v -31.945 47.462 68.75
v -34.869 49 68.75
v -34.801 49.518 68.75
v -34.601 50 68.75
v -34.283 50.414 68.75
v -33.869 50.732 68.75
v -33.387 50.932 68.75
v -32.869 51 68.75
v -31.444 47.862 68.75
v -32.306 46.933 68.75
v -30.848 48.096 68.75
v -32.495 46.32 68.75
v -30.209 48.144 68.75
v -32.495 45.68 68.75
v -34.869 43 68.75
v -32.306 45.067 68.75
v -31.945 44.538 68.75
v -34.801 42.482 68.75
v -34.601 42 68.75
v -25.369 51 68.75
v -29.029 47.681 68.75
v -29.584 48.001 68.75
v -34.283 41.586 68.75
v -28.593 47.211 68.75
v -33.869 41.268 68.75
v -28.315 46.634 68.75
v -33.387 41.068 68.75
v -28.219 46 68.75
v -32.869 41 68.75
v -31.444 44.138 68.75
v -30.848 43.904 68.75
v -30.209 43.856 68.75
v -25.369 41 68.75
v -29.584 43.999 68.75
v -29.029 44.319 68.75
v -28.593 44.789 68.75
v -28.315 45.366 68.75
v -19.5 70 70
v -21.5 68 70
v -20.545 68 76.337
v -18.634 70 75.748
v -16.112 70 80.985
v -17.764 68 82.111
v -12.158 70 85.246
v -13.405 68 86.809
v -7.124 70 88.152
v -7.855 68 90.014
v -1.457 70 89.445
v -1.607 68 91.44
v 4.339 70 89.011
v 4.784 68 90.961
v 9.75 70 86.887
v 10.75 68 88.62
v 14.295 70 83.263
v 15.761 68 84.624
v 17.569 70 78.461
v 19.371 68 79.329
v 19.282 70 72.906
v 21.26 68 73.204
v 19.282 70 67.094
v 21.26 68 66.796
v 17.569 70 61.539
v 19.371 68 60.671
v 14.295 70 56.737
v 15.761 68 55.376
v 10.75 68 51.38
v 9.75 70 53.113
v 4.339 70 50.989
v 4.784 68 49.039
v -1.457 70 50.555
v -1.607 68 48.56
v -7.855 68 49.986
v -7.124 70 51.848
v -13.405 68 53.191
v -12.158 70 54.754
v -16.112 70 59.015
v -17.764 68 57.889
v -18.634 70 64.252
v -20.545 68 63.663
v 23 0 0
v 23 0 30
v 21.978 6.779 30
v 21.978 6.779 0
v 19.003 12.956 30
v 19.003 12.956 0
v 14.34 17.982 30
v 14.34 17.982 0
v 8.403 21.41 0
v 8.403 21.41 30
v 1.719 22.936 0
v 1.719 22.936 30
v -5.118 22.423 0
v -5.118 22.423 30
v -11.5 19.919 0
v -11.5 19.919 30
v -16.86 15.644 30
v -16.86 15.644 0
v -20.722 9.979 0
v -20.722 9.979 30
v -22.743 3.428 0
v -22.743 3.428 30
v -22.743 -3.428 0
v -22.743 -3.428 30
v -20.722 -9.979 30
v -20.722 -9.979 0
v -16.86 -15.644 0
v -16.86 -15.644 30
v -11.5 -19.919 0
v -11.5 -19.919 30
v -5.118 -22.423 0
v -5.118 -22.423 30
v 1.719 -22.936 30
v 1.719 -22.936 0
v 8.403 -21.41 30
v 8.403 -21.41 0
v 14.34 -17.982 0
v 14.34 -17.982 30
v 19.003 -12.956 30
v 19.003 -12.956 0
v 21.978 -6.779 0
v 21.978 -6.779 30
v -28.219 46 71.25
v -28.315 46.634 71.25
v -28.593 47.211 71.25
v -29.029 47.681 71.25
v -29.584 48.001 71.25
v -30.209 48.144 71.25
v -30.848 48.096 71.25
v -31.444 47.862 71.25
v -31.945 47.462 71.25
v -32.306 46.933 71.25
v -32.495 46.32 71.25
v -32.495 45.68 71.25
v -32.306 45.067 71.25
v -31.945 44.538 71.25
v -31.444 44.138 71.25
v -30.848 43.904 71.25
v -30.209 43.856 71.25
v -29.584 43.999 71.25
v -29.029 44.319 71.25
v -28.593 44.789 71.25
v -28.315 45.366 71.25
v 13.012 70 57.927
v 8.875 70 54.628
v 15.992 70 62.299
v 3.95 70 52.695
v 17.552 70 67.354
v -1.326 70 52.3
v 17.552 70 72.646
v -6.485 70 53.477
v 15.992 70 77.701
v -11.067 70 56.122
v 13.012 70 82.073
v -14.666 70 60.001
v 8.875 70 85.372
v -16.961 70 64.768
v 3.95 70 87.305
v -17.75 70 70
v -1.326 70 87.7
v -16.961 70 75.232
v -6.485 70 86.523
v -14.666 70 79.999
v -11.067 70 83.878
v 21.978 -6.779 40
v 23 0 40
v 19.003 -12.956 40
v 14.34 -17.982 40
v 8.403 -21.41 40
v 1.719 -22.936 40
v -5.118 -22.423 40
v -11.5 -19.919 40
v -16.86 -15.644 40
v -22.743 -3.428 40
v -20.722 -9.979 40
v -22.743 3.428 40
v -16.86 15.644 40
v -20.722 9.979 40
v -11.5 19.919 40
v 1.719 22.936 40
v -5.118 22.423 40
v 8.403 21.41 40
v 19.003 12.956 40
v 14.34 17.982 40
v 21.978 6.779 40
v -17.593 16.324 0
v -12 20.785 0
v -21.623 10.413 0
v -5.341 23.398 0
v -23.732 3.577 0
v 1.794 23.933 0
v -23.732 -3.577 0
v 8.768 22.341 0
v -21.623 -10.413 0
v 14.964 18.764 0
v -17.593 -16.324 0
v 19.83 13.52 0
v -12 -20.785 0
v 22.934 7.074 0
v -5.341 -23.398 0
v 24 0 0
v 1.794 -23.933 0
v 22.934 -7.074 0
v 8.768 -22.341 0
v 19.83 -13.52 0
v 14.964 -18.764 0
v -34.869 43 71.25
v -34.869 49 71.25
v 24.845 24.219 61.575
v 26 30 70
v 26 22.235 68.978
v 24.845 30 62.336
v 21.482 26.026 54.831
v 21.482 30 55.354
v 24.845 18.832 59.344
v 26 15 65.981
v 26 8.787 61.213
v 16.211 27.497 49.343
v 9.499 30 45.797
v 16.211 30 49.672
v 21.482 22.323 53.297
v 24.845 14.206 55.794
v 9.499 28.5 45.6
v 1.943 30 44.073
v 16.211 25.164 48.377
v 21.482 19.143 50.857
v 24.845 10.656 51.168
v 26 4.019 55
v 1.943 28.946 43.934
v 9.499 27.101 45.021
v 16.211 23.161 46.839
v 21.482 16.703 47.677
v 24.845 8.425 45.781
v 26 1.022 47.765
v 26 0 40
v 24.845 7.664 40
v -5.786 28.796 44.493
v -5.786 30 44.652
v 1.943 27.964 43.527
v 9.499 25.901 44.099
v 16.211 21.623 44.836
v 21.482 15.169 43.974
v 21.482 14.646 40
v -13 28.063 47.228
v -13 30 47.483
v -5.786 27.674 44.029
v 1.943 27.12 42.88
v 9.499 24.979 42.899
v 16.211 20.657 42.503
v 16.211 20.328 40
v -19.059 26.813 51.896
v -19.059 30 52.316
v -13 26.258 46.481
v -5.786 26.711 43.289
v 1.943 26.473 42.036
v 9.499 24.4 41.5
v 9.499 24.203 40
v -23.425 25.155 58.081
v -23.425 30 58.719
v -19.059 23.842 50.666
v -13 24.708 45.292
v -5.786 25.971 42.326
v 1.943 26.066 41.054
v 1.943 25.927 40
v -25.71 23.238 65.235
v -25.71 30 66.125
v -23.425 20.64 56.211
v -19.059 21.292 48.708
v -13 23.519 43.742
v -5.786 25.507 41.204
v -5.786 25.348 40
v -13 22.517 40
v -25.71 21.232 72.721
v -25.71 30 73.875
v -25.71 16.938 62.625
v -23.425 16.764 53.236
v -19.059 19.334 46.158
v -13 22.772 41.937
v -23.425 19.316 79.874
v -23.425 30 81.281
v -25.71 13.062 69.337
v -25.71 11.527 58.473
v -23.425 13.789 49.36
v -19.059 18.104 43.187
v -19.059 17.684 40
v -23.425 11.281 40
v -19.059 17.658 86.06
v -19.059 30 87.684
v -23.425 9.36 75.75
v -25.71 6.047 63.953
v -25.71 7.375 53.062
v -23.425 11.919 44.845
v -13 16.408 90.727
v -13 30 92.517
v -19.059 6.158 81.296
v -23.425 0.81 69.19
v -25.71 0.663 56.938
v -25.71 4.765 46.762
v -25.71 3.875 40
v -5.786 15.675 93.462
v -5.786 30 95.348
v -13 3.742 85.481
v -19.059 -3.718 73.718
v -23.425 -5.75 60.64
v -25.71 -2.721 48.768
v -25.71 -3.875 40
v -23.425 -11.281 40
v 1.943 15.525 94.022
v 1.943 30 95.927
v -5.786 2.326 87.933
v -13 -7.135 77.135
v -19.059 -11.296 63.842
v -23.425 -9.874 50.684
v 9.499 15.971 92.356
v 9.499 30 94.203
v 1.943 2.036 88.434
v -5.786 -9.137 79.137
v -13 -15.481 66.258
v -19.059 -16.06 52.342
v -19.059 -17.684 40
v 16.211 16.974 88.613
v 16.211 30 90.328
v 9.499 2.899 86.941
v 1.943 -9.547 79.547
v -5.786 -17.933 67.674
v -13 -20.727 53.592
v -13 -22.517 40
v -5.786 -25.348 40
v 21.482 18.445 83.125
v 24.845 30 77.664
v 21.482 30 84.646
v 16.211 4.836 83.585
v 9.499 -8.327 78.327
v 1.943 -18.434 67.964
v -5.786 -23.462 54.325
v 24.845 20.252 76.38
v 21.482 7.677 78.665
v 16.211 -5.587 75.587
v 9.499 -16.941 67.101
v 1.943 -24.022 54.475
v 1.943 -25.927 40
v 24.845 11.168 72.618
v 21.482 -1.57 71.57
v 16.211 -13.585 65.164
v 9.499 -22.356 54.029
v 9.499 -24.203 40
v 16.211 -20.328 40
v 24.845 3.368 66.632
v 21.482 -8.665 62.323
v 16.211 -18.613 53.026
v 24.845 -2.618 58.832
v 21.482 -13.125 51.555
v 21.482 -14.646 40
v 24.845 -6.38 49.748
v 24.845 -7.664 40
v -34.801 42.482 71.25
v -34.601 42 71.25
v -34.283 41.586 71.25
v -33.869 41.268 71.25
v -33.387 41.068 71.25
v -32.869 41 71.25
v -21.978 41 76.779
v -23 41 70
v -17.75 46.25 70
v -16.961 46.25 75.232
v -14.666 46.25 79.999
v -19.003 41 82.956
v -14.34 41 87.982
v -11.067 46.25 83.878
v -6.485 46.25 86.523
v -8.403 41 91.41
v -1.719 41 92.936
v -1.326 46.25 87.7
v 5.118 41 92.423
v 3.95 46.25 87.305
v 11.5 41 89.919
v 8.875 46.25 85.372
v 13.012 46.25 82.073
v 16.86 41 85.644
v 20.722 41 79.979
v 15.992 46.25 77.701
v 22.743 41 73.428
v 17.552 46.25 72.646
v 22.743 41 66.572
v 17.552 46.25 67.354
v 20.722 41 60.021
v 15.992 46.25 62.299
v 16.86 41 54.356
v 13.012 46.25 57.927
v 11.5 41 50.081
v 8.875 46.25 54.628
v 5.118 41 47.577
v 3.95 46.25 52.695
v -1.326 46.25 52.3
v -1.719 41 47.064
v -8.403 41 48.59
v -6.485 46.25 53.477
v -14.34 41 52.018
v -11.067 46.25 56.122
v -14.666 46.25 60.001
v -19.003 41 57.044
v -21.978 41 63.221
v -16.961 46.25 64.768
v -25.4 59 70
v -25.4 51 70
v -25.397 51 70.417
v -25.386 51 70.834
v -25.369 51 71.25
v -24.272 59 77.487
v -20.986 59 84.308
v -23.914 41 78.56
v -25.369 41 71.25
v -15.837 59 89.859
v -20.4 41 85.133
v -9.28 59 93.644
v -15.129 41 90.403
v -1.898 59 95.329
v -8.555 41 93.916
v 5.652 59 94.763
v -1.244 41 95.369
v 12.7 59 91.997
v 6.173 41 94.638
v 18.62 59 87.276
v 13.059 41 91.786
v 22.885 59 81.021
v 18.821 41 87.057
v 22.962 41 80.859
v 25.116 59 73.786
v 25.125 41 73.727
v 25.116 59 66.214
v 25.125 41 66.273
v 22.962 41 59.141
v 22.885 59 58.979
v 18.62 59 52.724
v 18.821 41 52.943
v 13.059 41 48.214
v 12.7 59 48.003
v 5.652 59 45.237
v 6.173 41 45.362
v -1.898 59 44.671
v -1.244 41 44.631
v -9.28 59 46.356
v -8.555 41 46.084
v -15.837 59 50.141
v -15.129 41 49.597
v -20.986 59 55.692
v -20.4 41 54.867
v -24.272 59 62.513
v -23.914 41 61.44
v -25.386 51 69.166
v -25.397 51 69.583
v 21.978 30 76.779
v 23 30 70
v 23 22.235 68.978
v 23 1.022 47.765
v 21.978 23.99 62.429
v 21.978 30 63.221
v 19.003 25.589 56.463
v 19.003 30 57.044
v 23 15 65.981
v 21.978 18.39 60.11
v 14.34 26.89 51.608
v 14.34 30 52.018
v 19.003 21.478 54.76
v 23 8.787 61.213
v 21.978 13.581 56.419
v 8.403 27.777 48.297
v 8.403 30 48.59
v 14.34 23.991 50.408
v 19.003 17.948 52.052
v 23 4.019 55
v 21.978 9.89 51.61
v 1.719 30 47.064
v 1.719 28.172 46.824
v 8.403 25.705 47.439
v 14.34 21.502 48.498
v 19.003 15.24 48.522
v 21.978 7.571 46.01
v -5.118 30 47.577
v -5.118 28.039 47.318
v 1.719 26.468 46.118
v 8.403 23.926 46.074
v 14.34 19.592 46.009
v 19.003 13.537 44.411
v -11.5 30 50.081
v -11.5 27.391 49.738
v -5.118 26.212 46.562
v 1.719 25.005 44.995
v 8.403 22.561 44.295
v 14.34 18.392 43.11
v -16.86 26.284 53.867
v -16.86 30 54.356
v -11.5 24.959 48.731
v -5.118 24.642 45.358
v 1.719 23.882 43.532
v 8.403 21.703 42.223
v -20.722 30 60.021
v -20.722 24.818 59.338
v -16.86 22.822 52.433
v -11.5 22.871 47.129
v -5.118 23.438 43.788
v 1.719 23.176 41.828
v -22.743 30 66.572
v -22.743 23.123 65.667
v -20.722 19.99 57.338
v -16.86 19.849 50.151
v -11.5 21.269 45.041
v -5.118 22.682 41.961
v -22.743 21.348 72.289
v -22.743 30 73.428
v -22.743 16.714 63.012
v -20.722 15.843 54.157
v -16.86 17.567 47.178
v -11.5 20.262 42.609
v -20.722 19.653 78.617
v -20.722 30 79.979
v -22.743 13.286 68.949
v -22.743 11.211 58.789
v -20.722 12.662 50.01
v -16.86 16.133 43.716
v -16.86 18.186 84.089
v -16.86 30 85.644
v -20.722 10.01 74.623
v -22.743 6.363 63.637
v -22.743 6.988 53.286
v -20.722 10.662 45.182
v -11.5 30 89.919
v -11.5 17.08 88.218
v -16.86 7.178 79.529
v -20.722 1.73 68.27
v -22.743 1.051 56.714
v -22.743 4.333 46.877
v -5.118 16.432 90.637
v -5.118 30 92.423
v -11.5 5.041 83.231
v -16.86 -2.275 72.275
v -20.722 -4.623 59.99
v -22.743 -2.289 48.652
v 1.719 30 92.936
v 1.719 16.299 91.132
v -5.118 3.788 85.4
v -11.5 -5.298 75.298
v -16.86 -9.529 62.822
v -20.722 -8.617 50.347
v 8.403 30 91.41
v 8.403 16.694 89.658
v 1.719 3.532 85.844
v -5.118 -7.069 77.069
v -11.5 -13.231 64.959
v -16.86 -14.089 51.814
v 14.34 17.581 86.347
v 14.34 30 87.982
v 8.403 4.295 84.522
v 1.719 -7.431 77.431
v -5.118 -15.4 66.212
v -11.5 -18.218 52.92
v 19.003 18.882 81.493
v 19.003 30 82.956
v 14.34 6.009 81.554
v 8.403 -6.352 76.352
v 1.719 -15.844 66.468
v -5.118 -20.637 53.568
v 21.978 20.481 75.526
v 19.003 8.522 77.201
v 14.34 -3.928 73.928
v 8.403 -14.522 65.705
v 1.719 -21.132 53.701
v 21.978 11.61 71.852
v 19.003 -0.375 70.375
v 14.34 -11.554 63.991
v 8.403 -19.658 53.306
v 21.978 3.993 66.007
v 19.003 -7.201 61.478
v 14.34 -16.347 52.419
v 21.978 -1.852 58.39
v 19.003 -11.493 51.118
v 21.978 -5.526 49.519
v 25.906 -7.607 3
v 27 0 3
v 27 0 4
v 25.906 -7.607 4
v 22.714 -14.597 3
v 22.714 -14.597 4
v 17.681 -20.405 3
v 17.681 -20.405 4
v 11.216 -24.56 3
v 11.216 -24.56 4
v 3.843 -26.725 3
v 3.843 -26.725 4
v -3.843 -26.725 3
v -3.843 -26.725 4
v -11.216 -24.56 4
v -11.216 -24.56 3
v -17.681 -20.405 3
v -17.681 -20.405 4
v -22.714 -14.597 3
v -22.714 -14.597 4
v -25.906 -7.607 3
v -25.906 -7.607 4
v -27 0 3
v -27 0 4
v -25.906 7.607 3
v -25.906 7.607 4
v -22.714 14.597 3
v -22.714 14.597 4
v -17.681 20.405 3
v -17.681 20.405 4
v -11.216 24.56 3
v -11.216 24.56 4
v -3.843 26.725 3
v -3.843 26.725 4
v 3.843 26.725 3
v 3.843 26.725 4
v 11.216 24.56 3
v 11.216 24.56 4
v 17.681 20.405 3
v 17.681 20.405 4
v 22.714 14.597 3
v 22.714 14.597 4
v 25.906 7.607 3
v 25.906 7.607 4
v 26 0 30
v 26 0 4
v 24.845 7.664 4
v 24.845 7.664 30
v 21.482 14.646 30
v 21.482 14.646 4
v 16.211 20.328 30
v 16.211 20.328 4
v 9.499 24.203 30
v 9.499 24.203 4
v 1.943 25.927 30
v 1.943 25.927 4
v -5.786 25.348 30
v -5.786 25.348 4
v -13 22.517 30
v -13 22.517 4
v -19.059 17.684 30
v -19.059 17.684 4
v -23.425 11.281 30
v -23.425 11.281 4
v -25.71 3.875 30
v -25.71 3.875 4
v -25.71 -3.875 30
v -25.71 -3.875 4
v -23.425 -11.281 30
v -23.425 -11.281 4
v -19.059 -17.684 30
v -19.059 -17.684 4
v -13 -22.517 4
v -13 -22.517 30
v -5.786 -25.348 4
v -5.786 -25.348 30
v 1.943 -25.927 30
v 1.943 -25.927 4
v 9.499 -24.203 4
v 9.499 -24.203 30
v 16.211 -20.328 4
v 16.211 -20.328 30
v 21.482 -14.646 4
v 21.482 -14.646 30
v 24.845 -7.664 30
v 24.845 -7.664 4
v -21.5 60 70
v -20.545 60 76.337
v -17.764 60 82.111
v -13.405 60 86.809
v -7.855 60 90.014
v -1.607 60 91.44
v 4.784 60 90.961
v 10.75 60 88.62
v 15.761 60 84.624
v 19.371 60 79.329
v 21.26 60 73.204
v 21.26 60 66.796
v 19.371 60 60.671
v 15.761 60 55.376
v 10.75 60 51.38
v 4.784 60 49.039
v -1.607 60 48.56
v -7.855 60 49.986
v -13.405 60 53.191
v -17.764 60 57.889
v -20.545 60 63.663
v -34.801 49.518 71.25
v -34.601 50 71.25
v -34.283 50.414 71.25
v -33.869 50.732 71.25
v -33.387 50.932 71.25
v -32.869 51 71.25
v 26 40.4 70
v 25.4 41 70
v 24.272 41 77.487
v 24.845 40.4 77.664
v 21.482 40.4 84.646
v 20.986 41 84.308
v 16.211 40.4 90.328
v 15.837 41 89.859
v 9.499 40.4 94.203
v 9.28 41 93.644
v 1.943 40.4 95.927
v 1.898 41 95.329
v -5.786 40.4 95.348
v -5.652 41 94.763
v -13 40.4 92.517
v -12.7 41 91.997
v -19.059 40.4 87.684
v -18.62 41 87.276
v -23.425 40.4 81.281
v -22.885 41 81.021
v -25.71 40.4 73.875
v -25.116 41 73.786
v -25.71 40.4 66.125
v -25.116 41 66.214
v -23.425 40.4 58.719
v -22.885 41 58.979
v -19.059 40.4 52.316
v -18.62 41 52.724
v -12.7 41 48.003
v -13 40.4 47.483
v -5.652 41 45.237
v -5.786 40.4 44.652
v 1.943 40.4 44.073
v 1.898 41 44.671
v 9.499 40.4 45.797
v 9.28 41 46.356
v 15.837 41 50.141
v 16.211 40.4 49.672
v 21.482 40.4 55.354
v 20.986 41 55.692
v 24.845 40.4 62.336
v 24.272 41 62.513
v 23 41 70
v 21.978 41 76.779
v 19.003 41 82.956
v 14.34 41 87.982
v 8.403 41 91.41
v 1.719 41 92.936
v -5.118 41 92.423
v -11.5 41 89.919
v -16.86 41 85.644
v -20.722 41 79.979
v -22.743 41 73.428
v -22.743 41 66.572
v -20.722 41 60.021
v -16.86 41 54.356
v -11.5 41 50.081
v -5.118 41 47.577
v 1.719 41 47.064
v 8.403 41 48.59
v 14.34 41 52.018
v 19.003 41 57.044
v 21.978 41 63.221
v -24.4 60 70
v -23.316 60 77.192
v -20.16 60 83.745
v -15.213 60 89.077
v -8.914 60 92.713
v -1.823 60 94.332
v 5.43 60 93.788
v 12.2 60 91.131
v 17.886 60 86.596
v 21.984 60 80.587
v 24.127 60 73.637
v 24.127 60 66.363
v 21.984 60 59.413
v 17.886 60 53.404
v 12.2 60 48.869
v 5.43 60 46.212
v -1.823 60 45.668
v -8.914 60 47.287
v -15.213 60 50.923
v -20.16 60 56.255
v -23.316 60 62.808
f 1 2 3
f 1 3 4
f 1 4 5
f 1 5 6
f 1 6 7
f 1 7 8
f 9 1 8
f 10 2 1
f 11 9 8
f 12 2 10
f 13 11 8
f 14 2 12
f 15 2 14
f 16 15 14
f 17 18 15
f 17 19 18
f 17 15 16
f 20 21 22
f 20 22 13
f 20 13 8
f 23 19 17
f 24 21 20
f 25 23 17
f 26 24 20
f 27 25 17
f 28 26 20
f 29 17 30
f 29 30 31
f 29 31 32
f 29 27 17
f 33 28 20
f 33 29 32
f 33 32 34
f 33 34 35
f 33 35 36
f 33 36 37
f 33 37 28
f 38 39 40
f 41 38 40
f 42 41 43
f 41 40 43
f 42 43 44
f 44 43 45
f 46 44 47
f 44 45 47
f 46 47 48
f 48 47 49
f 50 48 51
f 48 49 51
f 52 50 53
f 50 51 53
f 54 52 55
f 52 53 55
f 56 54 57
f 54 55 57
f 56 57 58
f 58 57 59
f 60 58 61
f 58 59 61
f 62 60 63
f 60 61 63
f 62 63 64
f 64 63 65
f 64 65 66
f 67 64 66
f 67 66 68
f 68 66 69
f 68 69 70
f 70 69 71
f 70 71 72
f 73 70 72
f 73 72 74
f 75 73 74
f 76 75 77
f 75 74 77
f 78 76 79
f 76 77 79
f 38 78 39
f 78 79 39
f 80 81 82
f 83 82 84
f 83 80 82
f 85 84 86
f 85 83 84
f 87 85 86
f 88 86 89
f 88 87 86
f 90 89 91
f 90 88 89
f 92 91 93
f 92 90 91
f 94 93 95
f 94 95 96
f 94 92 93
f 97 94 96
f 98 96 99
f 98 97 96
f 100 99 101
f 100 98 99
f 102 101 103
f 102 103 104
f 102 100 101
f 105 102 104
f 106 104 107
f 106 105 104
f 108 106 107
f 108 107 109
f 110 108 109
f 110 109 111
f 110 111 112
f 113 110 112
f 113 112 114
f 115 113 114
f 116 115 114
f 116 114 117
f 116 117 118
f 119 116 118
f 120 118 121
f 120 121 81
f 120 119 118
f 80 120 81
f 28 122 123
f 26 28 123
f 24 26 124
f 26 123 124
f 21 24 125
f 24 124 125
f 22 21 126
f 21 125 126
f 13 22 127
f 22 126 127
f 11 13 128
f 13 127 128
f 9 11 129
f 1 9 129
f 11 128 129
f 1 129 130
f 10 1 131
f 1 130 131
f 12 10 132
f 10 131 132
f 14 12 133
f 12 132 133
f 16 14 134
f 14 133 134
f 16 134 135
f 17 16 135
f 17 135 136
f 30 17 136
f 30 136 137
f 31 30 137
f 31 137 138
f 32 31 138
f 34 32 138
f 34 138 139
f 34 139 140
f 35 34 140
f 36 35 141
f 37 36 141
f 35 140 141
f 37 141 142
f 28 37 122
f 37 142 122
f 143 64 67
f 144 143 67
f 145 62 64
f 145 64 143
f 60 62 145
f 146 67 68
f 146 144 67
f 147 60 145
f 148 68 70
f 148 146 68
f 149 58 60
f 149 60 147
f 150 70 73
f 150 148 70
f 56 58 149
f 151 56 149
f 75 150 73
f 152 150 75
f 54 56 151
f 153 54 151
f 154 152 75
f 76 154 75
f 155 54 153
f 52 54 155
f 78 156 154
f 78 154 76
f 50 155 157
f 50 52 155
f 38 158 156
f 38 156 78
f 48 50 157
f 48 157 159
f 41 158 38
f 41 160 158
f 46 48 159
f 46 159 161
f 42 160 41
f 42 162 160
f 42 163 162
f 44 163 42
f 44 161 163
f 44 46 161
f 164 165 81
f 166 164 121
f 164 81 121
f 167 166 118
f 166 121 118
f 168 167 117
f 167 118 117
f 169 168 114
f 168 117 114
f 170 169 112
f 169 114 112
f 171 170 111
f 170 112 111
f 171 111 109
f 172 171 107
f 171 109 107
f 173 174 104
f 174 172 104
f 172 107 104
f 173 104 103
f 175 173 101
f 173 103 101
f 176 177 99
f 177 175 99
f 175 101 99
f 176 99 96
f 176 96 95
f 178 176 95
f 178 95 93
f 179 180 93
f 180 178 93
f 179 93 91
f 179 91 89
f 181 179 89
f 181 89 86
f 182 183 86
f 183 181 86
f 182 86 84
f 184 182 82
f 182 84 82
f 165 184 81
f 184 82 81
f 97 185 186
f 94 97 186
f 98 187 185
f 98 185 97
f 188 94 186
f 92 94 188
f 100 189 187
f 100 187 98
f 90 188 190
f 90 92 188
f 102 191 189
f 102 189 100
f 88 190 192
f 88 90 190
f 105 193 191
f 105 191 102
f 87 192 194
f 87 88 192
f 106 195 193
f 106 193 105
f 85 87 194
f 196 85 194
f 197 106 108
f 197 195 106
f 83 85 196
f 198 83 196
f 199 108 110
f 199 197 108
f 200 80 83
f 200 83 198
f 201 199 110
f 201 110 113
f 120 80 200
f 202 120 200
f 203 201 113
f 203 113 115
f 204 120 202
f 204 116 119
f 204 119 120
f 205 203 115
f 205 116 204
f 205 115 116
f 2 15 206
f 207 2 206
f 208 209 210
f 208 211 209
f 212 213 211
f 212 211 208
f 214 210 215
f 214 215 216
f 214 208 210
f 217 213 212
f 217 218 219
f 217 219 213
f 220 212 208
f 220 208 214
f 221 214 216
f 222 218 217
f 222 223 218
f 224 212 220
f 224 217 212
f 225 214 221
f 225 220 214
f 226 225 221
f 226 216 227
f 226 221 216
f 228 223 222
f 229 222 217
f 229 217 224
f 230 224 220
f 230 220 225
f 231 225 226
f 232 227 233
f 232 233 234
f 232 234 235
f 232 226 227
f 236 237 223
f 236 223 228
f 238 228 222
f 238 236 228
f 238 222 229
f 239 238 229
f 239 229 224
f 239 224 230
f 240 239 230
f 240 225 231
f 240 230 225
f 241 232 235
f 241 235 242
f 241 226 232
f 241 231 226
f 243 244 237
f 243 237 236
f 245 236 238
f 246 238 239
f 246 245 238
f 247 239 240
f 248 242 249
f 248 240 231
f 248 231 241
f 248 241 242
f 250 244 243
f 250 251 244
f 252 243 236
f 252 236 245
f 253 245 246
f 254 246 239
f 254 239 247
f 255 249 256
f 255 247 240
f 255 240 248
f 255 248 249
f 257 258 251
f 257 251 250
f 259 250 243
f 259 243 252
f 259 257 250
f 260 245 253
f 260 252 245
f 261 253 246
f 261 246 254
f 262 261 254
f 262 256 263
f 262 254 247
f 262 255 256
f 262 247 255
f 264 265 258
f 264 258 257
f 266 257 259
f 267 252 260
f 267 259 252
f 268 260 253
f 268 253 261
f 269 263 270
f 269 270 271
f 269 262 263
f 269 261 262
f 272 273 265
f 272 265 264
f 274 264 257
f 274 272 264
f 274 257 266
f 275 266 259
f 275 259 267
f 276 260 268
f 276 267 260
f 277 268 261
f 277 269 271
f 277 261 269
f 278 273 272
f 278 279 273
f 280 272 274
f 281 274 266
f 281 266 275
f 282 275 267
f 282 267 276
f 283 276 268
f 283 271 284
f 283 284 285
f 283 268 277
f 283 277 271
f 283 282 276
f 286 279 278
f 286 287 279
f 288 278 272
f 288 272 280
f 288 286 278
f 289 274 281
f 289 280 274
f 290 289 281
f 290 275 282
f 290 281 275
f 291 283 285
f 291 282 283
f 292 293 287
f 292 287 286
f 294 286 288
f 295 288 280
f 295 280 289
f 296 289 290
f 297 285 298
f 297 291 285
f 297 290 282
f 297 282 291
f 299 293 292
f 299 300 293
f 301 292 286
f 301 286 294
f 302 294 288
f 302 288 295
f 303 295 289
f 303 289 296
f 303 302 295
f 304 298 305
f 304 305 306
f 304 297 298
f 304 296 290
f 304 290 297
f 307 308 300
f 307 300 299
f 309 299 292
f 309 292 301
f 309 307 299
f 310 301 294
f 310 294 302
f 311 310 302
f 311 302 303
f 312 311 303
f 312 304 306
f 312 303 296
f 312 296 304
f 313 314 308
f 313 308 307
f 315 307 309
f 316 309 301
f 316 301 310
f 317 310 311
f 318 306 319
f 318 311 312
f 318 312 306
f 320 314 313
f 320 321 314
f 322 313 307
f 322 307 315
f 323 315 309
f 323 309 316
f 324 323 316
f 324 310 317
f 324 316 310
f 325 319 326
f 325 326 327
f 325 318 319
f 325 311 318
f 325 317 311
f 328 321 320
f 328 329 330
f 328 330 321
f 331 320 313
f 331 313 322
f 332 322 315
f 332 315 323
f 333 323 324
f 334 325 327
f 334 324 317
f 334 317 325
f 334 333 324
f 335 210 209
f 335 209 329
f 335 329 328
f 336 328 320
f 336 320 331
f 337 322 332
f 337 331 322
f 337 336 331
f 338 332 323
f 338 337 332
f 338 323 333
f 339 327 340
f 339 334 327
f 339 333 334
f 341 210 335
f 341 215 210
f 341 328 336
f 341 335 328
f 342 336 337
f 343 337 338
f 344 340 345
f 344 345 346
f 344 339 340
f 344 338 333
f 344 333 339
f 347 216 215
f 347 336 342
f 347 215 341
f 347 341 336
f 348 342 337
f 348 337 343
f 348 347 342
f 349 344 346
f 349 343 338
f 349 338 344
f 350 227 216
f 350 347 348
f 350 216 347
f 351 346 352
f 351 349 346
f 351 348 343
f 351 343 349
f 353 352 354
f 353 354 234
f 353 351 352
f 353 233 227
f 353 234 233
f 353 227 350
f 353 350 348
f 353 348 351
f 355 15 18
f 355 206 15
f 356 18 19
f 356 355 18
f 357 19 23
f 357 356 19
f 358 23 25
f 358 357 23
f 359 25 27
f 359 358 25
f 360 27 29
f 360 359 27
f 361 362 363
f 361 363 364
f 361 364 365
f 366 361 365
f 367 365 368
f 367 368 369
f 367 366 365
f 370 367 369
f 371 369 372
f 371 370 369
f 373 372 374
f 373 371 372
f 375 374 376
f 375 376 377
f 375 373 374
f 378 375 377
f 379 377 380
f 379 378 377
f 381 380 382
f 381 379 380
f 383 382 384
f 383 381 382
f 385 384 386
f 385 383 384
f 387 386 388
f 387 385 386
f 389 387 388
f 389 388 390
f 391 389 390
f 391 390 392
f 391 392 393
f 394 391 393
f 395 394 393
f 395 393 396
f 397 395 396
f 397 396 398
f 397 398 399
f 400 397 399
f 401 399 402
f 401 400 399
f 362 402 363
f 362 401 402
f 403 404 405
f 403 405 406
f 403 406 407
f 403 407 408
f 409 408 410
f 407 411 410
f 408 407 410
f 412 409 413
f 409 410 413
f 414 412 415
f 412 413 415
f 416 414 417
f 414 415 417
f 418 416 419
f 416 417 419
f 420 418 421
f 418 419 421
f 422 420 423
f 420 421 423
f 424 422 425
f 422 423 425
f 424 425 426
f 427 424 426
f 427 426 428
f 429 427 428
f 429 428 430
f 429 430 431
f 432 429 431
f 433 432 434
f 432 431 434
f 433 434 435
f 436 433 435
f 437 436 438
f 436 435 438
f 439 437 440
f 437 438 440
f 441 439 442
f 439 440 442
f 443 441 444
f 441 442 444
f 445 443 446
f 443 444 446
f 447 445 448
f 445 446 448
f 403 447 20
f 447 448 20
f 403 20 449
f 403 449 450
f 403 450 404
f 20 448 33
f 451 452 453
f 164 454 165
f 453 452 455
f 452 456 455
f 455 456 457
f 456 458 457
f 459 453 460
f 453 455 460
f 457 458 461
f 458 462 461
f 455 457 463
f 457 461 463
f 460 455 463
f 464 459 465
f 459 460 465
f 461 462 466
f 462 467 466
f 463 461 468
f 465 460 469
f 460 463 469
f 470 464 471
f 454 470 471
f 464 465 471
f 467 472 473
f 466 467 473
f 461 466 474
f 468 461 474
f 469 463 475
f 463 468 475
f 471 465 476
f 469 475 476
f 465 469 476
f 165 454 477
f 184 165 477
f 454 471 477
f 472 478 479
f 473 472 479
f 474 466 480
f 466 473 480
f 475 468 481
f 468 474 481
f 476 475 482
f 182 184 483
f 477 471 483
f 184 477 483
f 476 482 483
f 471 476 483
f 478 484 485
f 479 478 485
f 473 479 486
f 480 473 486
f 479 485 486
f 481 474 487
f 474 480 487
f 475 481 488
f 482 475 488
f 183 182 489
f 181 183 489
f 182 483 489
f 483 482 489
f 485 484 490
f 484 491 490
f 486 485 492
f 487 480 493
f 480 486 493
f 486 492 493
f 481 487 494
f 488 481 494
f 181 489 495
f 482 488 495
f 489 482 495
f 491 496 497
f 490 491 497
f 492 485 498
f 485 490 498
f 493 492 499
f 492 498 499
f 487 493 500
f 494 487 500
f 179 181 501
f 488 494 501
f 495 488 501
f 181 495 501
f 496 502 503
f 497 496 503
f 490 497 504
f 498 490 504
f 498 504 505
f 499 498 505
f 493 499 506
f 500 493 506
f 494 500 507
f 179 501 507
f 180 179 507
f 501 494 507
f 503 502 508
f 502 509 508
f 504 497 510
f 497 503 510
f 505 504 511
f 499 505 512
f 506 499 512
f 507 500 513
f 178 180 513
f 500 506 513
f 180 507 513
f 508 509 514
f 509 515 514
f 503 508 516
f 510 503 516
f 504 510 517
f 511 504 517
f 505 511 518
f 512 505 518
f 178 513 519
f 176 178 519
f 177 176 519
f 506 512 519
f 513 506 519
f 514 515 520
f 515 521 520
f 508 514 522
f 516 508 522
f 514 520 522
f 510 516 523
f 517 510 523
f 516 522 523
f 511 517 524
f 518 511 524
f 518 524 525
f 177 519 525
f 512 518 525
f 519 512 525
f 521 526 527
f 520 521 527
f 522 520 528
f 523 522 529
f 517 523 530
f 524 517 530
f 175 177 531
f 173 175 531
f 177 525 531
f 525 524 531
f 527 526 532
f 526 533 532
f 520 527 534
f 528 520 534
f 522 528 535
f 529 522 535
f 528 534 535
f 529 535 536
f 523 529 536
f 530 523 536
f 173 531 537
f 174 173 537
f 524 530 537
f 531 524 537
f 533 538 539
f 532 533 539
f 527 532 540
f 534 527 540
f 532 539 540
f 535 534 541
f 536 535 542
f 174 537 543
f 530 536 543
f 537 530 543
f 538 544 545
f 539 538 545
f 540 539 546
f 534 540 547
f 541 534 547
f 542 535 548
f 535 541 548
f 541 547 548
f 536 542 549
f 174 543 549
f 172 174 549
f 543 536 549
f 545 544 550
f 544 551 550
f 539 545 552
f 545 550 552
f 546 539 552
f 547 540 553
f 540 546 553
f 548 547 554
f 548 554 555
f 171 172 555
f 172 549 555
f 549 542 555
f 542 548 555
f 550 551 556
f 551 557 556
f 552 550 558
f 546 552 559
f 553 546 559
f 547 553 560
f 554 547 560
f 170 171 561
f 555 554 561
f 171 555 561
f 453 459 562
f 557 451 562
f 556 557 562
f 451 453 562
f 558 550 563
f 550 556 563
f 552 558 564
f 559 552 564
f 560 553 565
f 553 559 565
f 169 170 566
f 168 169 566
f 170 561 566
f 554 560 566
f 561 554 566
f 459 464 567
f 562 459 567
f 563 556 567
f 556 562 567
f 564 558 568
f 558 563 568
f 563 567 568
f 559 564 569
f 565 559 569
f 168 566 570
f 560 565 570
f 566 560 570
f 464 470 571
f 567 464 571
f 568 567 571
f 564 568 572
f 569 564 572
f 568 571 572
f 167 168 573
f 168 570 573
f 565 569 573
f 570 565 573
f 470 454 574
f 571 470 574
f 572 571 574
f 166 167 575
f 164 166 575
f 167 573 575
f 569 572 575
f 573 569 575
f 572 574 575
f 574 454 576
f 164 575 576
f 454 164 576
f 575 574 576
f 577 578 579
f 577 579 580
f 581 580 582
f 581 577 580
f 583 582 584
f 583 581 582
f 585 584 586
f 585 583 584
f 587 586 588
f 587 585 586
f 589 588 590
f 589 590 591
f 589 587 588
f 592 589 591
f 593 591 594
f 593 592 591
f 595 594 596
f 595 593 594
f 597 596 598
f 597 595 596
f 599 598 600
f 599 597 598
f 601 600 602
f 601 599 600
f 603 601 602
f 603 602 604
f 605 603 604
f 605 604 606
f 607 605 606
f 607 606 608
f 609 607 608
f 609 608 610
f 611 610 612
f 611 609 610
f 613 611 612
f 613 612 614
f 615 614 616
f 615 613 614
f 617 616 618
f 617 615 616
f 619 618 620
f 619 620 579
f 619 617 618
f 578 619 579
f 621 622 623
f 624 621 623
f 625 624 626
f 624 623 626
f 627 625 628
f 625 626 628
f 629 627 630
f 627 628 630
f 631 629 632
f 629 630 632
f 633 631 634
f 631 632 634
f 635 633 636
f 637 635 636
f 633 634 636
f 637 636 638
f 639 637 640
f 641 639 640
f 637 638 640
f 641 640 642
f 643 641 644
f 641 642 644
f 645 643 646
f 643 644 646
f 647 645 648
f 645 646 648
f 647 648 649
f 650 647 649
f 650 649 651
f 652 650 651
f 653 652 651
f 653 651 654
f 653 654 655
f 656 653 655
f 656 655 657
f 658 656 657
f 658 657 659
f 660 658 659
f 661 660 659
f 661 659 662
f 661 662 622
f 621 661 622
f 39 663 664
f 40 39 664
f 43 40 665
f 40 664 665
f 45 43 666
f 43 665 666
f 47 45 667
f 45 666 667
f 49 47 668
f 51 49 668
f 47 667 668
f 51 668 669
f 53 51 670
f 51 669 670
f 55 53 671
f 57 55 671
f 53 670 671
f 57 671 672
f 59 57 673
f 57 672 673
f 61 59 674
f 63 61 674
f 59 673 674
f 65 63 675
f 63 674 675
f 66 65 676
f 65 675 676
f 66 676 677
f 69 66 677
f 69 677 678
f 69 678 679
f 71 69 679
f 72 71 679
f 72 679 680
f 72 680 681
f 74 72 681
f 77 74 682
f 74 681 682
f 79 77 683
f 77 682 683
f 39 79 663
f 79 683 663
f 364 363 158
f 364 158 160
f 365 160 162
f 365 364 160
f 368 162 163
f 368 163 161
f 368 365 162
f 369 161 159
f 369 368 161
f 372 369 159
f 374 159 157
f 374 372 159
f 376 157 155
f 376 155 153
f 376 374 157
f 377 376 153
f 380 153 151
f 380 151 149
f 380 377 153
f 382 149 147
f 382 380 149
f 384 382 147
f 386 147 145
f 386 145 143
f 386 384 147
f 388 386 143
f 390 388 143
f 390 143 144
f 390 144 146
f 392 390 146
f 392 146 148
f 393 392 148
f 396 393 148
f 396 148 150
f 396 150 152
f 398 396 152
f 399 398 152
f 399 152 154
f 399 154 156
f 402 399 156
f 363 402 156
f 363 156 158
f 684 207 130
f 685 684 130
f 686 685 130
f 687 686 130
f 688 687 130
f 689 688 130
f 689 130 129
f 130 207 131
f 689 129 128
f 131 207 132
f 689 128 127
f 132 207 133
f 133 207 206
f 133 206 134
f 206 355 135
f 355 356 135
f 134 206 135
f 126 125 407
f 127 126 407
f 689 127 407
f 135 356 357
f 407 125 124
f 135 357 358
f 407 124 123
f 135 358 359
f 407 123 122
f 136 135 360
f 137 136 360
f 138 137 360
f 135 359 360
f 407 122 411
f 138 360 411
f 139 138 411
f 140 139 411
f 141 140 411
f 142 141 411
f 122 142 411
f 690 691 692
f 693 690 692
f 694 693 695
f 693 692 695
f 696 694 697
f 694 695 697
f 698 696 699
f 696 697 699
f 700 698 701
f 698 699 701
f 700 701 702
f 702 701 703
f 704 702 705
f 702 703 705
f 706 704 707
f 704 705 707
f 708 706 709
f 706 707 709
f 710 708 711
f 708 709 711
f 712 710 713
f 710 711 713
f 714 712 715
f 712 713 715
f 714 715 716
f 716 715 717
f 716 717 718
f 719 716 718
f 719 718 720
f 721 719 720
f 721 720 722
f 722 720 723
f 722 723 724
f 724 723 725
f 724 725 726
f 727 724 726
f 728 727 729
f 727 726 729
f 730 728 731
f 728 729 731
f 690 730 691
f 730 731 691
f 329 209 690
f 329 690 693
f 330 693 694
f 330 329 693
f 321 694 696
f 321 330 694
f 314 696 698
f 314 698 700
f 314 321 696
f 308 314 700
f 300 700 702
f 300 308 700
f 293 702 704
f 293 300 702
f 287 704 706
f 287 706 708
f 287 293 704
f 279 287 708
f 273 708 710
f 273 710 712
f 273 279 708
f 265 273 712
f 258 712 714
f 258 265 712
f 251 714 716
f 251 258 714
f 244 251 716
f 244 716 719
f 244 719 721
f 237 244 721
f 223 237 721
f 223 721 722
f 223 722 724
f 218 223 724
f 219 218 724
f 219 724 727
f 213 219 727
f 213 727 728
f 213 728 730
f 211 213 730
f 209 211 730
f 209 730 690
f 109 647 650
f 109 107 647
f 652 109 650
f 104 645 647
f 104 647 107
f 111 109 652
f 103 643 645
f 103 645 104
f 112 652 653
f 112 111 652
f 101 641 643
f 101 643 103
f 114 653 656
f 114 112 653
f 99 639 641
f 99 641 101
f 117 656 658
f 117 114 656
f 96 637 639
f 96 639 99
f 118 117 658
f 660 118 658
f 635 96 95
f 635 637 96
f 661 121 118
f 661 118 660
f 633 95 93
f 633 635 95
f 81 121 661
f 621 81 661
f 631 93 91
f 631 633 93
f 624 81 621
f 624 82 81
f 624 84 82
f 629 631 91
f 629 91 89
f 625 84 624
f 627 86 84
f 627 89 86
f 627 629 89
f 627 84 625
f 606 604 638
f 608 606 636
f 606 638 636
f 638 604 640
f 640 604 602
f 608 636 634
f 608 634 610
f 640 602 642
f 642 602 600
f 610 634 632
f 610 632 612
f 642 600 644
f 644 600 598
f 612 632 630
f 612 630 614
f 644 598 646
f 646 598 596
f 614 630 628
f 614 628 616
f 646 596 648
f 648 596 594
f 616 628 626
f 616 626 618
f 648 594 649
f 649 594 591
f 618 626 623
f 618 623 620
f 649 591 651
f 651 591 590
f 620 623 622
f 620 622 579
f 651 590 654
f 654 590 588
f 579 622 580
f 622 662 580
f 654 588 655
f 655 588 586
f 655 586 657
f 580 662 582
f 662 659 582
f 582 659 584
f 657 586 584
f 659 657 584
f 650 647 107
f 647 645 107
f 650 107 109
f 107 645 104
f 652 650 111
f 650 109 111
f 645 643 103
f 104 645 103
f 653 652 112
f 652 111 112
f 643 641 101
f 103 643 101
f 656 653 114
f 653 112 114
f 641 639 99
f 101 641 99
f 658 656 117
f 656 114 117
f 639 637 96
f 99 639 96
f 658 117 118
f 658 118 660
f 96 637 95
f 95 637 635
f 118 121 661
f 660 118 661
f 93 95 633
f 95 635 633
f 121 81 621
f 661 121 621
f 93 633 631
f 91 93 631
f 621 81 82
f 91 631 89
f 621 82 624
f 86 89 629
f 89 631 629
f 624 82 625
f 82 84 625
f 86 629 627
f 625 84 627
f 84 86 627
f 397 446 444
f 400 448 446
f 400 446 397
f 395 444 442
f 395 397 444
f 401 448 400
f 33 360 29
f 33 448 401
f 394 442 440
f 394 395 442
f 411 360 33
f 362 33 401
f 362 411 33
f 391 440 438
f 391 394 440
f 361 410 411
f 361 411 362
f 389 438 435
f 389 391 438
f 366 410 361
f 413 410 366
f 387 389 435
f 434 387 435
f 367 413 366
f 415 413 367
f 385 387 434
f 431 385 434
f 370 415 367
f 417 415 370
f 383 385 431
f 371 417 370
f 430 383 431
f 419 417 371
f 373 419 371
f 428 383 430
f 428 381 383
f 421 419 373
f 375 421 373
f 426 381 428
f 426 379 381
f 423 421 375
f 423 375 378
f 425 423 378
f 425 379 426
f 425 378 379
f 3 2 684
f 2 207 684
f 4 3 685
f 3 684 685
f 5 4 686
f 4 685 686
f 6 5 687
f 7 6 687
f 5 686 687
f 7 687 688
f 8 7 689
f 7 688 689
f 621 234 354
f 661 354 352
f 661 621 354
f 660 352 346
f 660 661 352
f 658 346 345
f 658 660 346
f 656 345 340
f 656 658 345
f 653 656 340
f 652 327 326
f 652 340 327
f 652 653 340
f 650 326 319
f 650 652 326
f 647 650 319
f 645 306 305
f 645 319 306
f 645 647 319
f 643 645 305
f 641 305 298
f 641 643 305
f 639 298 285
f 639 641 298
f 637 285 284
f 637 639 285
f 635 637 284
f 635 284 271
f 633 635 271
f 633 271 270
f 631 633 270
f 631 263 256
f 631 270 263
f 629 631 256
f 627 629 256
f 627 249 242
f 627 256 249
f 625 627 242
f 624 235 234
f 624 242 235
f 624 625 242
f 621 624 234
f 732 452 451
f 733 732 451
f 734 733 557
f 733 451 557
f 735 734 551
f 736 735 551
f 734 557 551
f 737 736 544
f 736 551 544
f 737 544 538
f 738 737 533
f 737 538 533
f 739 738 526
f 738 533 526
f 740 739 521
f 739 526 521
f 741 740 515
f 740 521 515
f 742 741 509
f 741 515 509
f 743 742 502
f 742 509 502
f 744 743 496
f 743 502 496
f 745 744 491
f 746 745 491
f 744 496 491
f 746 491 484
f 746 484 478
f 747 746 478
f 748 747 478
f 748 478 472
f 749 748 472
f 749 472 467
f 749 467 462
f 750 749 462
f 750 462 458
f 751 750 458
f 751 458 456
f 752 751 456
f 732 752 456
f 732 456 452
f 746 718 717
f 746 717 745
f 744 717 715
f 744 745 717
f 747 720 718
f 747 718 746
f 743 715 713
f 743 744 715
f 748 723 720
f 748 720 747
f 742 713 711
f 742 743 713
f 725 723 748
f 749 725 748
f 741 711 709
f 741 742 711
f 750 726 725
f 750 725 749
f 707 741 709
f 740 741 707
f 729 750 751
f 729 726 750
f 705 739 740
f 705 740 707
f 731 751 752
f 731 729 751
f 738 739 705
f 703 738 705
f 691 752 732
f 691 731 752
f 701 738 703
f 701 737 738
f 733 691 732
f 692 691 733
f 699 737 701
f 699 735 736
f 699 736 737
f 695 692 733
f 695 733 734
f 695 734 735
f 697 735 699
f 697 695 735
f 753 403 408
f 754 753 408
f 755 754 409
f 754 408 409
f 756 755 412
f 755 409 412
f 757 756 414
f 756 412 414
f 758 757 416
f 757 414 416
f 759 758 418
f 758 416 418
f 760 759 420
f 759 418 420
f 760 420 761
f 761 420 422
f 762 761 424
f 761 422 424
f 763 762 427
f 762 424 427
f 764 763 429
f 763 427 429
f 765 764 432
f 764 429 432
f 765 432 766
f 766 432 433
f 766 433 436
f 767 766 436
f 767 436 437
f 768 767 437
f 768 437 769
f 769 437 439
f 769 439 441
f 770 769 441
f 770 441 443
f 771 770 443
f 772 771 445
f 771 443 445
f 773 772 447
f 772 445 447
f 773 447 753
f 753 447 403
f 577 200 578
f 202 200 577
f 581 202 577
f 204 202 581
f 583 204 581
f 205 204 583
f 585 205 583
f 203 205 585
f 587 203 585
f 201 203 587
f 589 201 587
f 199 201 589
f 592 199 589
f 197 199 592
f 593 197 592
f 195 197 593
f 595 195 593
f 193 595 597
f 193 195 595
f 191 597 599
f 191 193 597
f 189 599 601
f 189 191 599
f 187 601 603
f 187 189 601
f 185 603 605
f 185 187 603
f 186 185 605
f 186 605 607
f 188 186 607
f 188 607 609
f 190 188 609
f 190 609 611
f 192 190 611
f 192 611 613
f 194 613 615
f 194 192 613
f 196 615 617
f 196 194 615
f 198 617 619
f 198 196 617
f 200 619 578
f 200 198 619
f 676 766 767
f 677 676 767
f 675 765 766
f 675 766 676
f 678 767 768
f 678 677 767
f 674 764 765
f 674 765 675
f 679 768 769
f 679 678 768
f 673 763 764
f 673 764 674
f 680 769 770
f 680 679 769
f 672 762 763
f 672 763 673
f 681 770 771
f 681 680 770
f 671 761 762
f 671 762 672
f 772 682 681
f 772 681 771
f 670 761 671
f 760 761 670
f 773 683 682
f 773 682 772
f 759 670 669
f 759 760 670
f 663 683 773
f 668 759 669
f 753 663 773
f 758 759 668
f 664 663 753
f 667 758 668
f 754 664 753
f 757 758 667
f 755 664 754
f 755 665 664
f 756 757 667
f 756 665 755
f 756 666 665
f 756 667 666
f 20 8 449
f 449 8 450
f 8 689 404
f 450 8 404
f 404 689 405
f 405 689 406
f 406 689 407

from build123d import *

# Parameters (mm, degrees)
F4_R      = 26
F4_R_2    = 23
F5_DEPTH  = 30
F6_R      = 27
F6_R_2    = 26
F7_DEPTH  = 4
F8_SIZE   = 3
F10_R     = 26
F10_R_2   = 23
F12_R     = 25.4
F12_R_2   = 17.75
F13_DEPTH = 19
F14_R     = 21.5
F14_R_2   = 17.75
F15_DEPTH = 10
F16_SIZE  = 5.25
F17_SIZE  = 0.6
F18_SIZE  = 2
F19_SIZE  = 1
F20_W     = 9.5
F20_H     = 2.5
F21_DEPTH = 10
F22_R     = 2.15
F23_DEPTH = 2.5
F24_R     = 2


with BuildPart() as f5:
    # F4 (on Top) → F5 (new body)
    with BuildSketch(Plane.XY):
        Circle(F4_R)
        Circle(F4_R_2, mode=Mode.SUBTRACT)
    extrude(amount=F5_DEPTH)

    # F6 (on face) → F7 (join)
    with BuildSketch(Plane(origin=(0, 0, 0), x_dir=(1, 0, 0), z_dir=(0, 0, -1))):
        Circle(F6_R)
        Circle(F6_R_2, mode=Mode.SUBTRACT)
    extrude(amount=-F7_DEPTH)

    # F8
    f8_edges = [f5.edges().sort_by_distance(p)[0] for p in [
        (-27, 0, 0),
    ]]
    chamfer(f8_edges, length=F8_SIZE)


with BuildPart() as f11:
    # F11: sweep along a path in F9
    with BuildLine(Plane.YZ) as f11_path:
        Line((41, 70), (30, 70))
        ThreePointArc((30, 70), (8.7867965644, 61.2132034356), (0, 40))
        Line((0, 40), (0, 30))
    # F10 (on face) → F11 (sweep)
    with BuildSketch(Plane.XY.offset(30)):
        Circle(F10_R)
        Circle(F10_R_2, mode=Mode.SUBTRACT)
    sweep(path=f11_path.line)

    # F17
    f17_edges = [f11.edges().sort_by_distance(p)[0] for p in [
        (-26, 41, 70),
    ]]
    chamfer(f17_edges, length=F17_SIZE)


with BuildPart() as f13:
    # F12 (on face) → F13 (new body)
    with BuildSketch(Plane(origin=(0, 41, 0), x_dir=(-1, 0, 0), z_dir=(0, 1, 0))):
        with Locations((0, 70)):
            Circle(F12_R)
        with Locations((0, 70)):
            Circle(F12_R_2, mode=Mode.SUBTRACT)
    extrude(amount=F13_DEPTH)

    # F14 (on face) → F15 (join)
    with BuildSketch(Plane(origin=(0, 60, 0), x_dir=(-1, 0, 0), z_dir=(0, 1, 0))):
        with Locations((0, 70)):
            Circle(F14_R)
        with Locations((0, 70)):
            Circle(F14_R_2, mode=Mode.SUBTRACT)
    extrude(amount=F15_DEPTH)

    # F16
    f16_edges = [f13.edges().sort_by_distance(p)[0] for p in [
        (17.75, 41, 70),
    ]]
    chamfer(f16_edges, length=F16_SIZE)

    # F18
    f18_edges = [f13.edges().sort_by_distance(p)[0] for p in [
        (21.5, 70, 70),
    ]]
    chamfer(f18_edges, length=F18_SIZE)

    # F19
    f19_edges = [f13.edges().sort_by_distance(p)[0] for p in [
        (25.4, 60, 70),
    ]]
    chamfer(f19_edges, length=F19_SIZE)

    # F20 (on face) → F21 (join)
    with BuildSketch(Plane.XZ.offset(-41)):
        with Locations((-30.1192234804, 70)):
            Rectangle(F20_W, F20_H)
    extrude(amount=-F21_DEPTH)

    # F22 (on face) → F23 (cut, through all)
    with BuildSketch(Plane.XY.offset(71.25)):
        with Locations((-30.3692234804, 46)):
            Circle(F22_R)
    extrude(amount=-F23_DEPTH, mode=Mode.SUBTRACT)

    # F24
    f24_edges = [f13.edges().sort_by_distance(p)[0] for p in [
        (-34.869223, 51, 70),
        (-34.869223, 41, 70),
    ]]
    fillet(f24_edges, radius=F24_R)


solid = Compound([f5.part, f11.part, f13.part])
